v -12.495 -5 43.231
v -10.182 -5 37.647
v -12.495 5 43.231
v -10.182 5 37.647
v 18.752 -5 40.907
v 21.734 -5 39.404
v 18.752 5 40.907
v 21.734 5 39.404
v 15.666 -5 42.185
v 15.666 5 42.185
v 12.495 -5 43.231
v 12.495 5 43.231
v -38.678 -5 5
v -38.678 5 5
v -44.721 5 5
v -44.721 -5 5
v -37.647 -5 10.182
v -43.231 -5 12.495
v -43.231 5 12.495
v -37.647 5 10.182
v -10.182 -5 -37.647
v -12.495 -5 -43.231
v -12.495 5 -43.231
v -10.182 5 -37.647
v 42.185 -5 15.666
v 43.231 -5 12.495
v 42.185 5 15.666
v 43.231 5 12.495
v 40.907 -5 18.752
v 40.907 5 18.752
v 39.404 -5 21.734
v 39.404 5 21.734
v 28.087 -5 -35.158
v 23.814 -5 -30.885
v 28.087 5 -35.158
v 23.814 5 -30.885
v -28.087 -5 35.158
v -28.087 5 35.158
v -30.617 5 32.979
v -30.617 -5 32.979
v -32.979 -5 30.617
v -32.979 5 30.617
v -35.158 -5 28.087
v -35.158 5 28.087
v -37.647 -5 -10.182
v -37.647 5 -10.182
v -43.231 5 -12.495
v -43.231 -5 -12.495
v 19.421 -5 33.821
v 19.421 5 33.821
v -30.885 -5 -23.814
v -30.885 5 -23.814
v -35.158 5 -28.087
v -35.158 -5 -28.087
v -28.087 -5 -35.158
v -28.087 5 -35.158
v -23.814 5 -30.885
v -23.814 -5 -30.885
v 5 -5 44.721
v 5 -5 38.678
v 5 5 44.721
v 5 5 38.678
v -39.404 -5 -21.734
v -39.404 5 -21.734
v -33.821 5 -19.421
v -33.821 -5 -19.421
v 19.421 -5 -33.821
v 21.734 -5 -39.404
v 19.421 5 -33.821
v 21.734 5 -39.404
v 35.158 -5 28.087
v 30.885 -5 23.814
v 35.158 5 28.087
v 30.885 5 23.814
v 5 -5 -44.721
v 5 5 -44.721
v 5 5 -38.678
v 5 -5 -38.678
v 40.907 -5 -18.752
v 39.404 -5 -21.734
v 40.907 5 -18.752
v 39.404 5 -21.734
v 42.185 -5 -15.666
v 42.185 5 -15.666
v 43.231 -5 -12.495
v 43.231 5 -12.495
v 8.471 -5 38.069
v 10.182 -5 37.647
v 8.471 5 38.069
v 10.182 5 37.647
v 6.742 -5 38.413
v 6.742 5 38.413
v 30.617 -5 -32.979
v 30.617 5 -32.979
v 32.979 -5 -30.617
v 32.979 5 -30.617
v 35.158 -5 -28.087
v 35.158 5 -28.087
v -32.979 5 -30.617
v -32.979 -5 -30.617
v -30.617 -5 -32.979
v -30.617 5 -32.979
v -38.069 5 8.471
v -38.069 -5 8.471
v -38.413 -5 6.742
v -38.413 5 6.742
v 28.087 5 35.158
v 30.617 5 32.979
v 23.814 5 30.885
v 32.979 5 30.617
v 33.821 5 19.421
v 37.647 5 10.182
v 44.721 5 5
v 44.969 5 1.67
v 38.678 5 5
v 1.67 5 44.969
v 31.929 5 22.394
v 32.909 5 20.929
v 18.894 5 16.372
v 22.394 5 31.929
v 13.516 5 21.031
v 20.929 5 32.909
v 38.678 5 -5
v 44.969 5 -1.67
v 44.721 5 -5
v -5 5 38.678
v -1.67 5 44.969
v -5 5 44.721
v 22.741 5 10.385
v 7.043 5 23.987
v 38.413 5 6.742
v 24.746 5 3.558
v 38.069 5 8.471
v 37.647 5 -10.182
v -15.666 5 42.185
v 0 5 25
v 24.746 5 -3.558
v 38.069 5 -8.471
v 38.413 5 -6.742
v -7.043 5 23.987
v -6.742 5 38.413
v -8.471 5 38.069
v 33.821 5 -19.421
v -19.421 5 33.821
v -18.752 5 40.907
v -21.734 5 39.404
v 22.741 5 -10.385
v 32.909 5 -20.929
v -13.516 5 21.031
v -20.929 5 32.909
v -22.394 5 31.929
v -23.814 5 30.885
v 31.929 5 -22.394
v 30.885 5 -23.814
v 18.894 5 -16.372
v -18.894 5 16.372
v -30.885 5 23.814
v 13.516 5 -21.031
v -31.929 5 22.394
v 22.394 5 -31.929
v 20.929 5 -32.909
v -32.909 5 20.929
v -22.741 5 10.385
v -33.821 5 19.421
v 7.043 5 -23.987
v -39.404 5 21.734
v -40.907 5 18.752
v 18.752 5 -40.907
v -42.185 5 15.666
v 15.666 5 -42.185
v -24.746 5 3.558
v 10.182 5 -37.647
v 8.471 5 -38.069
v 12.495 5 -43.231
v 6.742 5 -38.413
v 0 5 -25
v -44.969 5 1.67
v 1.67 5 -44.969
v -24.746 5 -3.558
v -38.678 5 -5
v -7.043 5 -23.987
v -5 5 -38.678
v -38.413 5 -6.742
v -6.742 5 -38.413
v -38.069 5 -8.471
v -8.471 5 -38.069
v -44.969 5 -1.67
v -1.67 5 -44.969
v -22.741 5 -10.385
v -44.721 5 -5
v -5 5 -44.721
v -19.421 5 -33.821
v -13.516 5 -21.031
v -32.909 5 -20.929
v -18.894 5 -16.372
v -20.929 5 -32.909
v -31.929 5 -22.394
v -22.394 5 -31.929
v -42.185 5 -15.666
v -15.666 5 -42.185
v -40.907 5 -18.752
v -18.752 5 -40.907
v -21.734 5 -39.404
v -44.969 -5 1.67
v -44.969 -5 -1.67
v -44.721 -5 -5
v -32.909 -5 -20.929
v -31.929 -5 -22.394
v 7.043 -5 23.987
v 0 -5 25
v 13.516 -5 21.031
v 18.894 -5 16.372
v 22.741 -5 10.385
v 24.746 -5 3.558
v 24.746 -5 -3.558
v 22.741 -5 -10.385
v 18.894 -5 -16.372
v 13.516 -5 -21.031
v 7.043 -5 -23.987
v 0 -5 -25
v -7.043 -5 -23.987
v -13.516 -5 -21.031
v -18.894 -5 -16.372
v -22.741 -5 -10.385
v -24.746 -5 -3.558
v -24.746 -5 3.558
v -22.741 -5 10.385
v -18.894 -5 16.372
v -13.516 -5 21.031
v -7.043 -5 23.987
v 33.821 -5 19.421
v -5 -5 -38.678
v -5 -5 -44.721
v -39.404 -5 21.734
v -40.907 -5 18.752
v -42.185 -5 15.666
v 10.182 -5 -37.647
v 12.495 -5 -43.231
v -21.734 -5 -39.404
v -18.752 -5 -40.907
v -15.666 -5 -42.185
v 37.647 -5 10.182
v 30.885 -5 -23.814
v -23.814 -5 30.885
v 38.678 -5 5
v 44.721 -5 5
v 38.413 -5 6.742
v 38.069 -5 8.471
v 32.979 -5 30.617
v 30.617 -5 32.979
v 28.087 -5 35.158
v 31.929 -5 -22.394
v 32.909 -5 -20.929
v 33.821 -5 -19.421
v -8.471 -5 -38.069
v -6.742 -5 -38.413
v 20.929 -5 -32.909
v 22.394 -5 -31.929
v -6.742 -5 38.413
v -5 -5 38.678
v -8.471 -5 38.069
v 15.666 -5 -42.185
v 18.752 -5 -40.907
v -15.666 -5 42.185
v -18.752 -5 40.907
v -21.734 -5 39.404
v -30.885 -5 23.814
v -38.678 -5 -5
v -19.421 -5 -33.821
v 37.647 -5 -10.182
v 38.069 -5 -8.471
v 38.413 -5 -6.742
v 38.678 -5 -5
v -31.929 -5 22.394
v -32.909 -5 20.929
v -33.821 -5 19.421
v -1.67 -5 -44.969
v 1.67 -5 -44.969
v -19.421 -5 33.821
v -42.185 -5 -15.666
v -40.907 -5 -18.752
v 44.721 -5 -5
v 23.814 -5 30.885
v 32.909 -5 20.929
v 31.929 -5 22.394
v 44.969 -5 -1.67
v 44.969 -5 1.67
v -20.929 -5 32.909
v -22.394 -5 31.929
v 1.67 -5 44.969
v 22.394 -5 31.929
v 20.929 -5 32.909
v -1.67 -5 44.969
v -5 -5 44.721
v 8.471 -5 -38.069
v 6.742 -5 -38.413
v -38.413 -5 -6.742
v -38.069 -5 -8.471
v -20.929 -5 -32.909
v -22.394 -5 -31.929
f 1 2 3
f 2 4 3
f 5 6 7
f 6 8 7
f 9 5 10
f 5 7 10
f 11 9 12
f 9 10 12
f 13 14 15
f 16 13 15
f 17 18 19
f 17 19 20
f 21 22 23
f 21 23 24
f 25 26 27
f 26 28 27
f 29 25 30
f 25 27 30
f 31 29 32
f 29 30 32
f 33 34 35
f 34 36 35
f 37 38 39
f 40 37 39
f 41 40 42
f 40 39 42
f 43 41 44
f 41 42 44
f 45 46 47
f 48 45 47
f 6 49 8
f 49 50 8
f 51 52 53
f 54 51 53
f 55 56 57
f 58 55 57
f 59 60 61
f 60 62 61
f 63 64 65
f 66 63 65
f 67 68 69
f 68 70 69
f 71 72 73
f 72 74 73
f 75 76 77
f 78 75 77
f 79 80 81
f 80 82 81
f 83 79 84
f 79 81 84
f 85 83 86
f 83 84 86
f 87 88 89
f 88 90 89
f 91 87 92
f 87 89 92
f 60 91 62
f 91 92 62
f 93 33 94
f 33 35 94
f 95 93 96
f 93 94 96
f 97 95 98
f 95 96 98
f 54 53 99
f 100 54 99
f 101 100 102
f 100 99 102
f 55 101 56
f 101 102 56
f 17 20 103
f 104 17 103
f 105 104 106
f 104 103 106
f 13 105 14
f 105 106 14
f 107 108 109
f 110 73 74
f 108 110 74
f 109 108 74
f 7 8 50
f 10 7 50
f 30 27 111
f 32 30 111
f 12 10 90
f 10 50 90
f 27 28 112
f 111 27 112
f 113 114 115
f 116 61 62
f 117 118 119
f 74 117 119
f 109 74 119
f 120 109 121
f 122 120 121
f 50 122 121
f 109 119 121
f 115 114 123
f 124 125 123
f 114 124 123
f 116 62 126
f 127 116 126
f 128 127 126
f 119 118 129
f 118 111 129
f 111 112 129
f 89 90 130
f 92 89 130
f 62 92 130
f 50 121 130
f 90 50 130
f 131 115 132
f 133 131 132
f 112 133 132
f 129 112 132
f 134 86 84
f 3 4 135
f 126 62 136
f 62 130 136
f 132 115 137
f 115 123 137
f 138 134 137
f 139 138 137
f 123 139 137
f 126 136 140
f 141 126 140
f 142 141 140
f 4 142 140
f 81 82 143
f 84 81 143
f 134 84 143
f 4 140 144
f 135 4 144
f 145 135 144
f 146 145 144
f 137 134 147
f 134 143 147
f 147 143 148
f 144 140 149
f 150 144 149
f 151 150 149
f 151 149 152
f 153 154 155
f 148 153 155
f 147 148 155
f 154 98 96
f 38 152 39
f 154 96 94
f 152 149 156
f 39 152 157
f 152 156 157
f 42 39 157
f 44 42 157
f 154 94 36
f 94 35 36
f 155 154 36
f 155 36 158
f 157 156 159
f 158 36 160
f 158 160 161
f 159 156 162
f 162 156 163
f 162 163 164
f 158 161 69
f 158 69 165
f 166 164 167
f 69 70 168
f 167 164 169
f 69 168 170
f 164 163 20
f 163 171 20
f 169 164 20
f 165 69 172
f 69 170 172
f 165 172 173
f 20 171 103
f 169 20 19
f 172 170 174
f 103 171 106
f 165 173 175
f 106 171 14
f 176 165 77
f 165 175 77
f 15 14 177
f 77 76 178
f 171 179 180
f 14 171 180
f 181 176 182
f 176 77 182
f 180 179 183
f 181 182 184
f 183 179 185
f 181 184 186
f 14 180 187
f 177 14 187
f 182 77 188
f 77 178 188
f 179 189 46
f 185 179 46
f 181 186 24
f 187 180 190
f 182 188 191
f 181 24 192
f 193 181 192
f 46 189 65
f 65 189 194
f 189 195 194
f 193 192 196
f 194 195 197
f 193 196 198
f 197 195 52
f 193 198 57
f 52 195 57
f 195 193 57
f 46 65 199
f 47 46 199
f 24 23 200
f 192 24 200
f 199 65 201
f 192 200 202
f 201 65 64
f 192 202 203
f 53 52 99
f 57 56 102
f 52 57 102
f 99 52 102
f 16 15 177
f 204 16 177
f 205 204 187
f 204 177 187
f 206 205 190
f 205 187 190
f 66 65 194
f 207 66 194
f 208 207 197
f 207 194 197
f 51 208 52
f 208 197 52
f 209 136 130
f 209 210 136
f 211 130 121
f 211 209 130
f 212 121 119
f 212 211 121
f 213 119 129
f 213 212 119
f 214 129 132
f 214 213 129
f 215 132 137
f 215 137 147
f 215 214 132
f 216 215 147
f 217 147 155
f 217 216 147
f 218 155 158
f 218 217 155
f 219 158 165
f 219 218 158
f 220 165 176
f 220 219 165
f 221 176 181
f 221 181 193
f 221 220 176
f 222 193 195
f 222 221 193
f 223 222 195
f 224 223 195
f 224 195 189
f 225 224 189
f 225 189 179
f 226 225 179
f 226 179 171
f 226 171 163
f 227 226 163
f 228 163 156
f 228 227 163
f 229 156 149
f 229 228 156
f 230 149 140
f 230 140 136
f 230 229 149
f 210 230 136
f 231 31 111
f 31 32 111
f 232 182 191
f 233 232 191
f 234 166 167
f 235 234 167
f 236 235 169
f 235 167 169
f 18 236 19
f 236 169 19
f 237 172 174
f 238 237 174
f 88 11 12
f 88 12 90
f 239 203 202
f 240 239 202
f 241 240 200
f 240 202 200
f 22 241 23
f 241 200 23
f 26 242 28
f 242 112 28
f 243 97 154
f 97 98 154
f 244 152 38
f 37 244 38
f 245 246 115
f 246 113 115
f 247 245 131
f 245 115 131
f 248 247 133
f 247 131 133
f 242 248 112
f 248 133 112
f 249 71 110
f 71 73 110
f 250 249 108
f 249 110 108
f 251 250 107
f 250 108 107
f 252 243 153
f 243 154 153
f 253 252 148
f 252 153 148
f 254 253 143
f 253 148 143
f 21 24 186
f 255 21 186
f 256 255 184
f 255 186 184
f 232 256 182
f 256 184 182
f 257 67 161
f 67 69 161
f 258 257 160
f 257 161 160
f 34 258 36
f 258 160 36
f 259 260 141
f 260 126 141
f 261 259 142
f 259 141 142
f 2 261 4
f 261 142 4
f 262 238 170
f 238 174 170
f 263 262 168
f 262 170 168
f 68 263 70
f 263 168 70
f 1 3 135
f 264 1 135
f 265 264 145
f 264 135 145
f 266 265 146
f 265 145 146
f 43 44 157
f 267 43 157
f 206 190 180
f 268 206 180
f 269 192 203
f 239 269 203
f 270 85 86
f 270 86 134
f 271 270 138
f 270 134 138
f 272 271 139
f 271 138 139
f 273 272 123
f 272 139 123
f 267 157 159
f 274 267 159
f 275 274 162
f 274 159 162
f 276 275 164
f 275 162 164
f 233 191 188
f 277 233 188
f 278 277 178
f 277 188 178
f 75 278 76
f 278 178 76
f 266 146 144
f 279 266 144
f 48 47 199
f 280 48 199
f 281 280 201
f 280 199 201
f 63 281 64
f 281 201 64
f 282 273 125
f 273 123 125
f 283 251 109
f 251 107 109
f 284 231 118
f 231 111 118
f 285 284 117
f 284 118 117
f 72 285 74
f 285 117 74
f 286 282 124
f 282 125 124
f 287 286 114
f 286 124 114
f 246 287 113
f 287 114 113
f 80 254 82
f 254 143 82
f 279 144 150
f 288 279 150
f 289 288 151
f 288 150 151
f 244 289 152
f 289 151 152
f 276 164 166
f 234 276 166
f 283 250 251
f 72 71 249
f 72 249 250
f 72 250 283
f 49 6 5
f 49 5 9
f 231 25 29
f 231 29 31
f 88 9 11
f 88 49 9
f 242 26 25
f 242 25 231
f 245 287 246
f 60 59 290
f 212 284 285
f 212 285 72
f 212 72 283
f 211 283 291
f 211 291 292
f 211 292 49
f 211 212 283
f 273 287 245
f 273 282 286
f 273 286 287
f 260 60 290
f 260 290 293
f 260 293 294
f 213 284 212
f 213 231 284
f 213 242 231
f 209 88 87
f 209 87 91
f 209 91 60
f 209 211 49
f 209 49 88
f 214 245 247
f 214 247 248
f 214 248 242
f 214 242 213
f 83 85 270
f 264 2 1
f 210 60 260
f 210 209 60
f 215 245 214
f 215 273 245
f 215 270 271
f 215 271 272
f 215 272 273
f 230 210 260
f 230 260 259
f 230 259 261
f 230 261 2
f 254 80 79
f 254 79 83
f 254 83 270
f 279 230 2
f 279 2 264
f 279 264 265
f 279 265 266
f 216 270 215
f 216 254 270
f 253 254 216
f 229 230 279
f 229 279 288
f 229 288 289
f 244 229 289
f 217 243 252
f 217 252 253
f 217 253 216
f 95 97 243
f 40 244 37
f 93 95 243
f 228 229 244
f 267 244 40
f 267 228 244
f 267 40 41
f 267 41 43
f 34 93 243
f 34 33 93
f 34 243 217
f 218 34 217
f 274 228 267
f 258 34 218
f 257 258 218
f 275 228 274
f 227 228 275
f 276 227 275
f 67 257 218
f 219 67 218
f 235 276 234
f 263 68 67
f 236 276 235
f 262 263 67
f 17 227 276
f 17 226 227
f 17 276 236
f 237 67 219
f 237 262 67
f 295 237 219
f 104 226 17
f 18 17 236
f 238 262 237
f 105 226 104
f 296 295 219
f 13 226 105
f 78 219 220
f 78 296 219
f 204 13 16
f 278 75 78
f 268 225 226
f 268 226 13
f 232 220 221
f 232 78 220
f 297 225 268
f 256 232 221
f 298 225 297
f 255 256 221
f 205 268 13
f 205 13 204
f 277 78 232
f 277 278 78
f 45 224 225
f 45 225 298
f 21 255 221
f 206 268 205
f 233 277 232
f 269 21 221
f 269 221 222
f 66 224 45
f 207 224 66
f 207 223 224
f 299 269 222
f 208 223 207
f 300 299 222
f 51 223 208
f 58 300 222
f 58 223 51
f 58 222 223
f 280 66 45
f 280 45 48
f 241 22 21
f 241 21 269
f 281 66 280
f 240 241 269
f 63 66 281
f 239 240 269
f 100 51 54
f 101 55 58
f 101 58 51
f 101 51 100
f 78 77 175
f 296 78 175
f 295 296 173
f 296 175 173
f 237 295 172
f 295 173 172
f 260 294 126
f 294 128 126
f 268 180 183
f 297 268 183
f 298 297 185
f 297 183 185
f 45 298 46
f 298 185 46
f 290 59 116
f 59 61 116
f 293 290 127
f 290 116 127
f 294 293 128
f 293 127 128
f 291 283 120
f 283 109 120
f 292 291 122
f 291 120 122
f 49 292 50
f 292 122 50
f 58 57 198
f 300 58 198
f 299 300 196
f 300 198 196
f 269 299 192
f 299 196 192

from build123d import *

# Parameters (mm, degrees)
SKETCH1_R           = 25
BOSS_EXTRUDE1_DEPTH = 5


with BuildPart() as part:
    # Sketch1 → Boss-Extrude1 (new, symmetric)
    with BuildSketch(Plane(origin=(0, 0, 0), x_dir=(1, 0, 0), z_dir=(0, 1, 0))):
        with BuildLine():
            Line((10.182093062, 37.647376813), (12.49472571, 43.230565916))
            ThreePointArc((12.49472571, 43.230565916), (17.220754456, 41.574578963), (21.733521035, 39.403731592))
            Line((21.733521035, 39.403731592), (19.420888387, 33.820542489))
            ThreePointArc((19.420888387, 33.820542489), (21.667239088, 32.42731488), (23.814054756, 30.885122568))
            Line((23.814054756, 30.885122568), (28.087242696, 35.158310508))
            ThreePointArc((28.087242696, 35.158310508), (31.819805153, 31.819805153), (35.158310508, 28.087242696))
            Line((35.158310508, 28.087242696), (30.885122568, 23.814054756))
            ThreePointArc((30.885122568, 23.814054756), (32.42731488, 21.667239088), (33.820542489, 19.420888387))
            Line((33.820542489, 19.420888387), (39.403731592, 21.733521035))
            ThreePointArc((39.403731592, 21.733521035), (41.574578963, 17.220754456), (43.230565916, 12.49472571))
            Line((43.230565916, 12.49472571), (37.647376813, 10.182093062))
            ThreePointArc((37.647376813, 10.182093062), (38.250625936, 7.608522559), (38.678159212, 5))
            Line((38.678159212, 5), (44.72135955, 5))
            ThreePointArc((44.72135955, 5), (45, 0), (44.72135955, -5))
            Line((44.72135955, -5), (38.678159212, -5))
            ThreePointArc((38.678159212, -5), (38.250625936, -7.608522559), (37.647376813, -10.182093062))
            Line((37.647376813, -10.182093062), (43.230565916, -12.49472571))
            ThreePointArc((43.230565916, -12.49472571), (41.574578963, -17.220754456), (39.403731592, -21.733521035))
            Line((39.403731592, -21.733521035), (33.820542489, -19.420888387))
            ThreePointArc((33.820542489, -19.420888387), (32.42731488, -21.667239088), (30.885122568, -23.814054756))
            Line((30.885122568, -23.814054756), (35.158310508, -28.087242696))
            ThreePointArc((35.158310508, -28.087242696), (31.819805153, -31.819805153), (28.087242696, -35.158310508))
            Line((28.087242696, -35.158310508), (23.814054756, -30.885122568))
            ThreePointArc((23.814054756, -30.885122568), (21.667239088, -32.42731488), (19.420888387, -33.820542489))
            Line((19.420888387, -33.820542489), (21.733521035, -39.403731592))
            ThreePointArc((21.733521035, -39.403731592), (17.220754456, -41.574578963), (12.49472571, -43.230565916))
            Line((12.49472571, -43.230565916), (10.182093062, -37.647376813))
            ThreePointArc((10.182093062, -37.647376813), (7.608522559, -38.250625936), (5, -38.678159212))
            Line((5, -38.678159212), (5, -44.72135955))
            ThreePointArc((5, -44.72135955), (0, -45), (-5, -44.72135955))
            Line((-5, -44.72135955), (-5, -38.678159212))
            ThreePointArc((-5, -38.678159212), (-7.608522559, -38.250625936), (-10.182093062, -37.647376813))
            Line((-10.182093062, -37.647376813), (-12.49472571, -43.230565916))
            ThreePointArc((-12.49472571, -43.230565916), (-17.220754456, -41.574578963), (-21.733521035, -39.403731592))
            Line((-21.733521035, -39.403731592), (-19.420888387, -33.820542489))
            ThreePointArc((-19.420888387, -33.820542489), (-21.667239088, -32.42731488), (-23.814054756, -30.885122568))
            Line((-23.814054756, -30.885122568), (-28.087242696, -35.158310508))
            ThreePointArc((-28.087242696, -35.158310508), (-31.819805153, -31.819805153), (-35.158310508, -28.087242696))
            Line((-35.158310508, -28.087242696), (-30.885122568, -23.814054756))
            ThreePointArc((-30.885122568, -23.814054756), (-32.42731488, -21.667239088), (-33.820542489, -19.420888387))
            Line((-33.820542489, -19.420888387), (-39.403731592, -21.733521035))
            ThreePointArc((-39.403731592, -21.733521035), (-41.574578963, -17.220754456), (-43.230565916, -12.49472571))
            Line((-43.230565916, -12.49472571), (-37.647376813, -10.182093062))
            ThreePointArc((-37.647376813, -10.182093062), (-38.250625936, -7.608522559), (-38.678159212, -5))
            Line((-38.678159212, -5), (-44.72135955, -5))
            ThreePointArc((-44.72135955, -5), (-45, 0), (-44.72135955, 5))
            Line((-44.72135955, 5), (-38.678159212, 5))
            ThreePointArc((-38.678159212, 5), (-38.250625936, 7.608522559), (-37.647376813, 10.182093062))
            Line((-37.647376813, 10.182093062), (-43.230565916, 12.49472571))
            ThreePointArc((-43.230565916, 12.49472571), (-41.574578963, 17.220754456), (-39.403731592, 21.733521035))
            Line((-39.403731592, 21.733521035), (-33.820542489, 19.420888387))
            ThreePointArc((-33.820542489, 19.420888387), (-32.42731488, 21.667239088), (-30.885122568, 23.814054756))
            Line((-30.885122568, 23.814054756), (-35.158310508, 28.087242696))
            ThreePointArc((-35.158310508, 28.087242696), (-31.819805153, 31.819805153), (-28.087242696, 35.158310508))
            Line((-28.087242696, 35.158310508), (-23.814054756, 30.885122568))
            ThreePointArc((-23.814054756, 30.885122568), (-21.667239088, 32.42731488), (-19.420888387, 33.820542489))
            Line((-19.420888387, 33.820542489), (-21.733521035, 39.403731592))
            ThreePointArc((-21.733521035, 39.403731592), (-17.220754456, 41.574578963), (-12.49472571, 43.230565916))
            Line((-12.49472571, 43.230565916), (-10.182093062, 37.647376813))
            ThreePointArc((-10.182093062, 37.647376813), (-7.608522559, 38.250625936), (-5, 38.678159212))
            Line((-5, 38.678159212), (-5, 44.72135955))
            ThreePointArc((-5, 44.72135955), (0, 45), (5, 44.72135955))
            Line((5, 44.72135955), (5, 38.678159212))
            ThreePointArc((5, 38.678159212), (7.608522559, 38.250625936), (10.182093062, 37.647376813))
        make_face()
        with Locations(Location((0, 0, 0), (0, 0, 270))):
            Circle(SKETCH1_R, mode=Mode.SUBTRACT)
    extrude(amount=BOSS_EXTRUDE1_DEPTH, both=True)


solid = part.part
